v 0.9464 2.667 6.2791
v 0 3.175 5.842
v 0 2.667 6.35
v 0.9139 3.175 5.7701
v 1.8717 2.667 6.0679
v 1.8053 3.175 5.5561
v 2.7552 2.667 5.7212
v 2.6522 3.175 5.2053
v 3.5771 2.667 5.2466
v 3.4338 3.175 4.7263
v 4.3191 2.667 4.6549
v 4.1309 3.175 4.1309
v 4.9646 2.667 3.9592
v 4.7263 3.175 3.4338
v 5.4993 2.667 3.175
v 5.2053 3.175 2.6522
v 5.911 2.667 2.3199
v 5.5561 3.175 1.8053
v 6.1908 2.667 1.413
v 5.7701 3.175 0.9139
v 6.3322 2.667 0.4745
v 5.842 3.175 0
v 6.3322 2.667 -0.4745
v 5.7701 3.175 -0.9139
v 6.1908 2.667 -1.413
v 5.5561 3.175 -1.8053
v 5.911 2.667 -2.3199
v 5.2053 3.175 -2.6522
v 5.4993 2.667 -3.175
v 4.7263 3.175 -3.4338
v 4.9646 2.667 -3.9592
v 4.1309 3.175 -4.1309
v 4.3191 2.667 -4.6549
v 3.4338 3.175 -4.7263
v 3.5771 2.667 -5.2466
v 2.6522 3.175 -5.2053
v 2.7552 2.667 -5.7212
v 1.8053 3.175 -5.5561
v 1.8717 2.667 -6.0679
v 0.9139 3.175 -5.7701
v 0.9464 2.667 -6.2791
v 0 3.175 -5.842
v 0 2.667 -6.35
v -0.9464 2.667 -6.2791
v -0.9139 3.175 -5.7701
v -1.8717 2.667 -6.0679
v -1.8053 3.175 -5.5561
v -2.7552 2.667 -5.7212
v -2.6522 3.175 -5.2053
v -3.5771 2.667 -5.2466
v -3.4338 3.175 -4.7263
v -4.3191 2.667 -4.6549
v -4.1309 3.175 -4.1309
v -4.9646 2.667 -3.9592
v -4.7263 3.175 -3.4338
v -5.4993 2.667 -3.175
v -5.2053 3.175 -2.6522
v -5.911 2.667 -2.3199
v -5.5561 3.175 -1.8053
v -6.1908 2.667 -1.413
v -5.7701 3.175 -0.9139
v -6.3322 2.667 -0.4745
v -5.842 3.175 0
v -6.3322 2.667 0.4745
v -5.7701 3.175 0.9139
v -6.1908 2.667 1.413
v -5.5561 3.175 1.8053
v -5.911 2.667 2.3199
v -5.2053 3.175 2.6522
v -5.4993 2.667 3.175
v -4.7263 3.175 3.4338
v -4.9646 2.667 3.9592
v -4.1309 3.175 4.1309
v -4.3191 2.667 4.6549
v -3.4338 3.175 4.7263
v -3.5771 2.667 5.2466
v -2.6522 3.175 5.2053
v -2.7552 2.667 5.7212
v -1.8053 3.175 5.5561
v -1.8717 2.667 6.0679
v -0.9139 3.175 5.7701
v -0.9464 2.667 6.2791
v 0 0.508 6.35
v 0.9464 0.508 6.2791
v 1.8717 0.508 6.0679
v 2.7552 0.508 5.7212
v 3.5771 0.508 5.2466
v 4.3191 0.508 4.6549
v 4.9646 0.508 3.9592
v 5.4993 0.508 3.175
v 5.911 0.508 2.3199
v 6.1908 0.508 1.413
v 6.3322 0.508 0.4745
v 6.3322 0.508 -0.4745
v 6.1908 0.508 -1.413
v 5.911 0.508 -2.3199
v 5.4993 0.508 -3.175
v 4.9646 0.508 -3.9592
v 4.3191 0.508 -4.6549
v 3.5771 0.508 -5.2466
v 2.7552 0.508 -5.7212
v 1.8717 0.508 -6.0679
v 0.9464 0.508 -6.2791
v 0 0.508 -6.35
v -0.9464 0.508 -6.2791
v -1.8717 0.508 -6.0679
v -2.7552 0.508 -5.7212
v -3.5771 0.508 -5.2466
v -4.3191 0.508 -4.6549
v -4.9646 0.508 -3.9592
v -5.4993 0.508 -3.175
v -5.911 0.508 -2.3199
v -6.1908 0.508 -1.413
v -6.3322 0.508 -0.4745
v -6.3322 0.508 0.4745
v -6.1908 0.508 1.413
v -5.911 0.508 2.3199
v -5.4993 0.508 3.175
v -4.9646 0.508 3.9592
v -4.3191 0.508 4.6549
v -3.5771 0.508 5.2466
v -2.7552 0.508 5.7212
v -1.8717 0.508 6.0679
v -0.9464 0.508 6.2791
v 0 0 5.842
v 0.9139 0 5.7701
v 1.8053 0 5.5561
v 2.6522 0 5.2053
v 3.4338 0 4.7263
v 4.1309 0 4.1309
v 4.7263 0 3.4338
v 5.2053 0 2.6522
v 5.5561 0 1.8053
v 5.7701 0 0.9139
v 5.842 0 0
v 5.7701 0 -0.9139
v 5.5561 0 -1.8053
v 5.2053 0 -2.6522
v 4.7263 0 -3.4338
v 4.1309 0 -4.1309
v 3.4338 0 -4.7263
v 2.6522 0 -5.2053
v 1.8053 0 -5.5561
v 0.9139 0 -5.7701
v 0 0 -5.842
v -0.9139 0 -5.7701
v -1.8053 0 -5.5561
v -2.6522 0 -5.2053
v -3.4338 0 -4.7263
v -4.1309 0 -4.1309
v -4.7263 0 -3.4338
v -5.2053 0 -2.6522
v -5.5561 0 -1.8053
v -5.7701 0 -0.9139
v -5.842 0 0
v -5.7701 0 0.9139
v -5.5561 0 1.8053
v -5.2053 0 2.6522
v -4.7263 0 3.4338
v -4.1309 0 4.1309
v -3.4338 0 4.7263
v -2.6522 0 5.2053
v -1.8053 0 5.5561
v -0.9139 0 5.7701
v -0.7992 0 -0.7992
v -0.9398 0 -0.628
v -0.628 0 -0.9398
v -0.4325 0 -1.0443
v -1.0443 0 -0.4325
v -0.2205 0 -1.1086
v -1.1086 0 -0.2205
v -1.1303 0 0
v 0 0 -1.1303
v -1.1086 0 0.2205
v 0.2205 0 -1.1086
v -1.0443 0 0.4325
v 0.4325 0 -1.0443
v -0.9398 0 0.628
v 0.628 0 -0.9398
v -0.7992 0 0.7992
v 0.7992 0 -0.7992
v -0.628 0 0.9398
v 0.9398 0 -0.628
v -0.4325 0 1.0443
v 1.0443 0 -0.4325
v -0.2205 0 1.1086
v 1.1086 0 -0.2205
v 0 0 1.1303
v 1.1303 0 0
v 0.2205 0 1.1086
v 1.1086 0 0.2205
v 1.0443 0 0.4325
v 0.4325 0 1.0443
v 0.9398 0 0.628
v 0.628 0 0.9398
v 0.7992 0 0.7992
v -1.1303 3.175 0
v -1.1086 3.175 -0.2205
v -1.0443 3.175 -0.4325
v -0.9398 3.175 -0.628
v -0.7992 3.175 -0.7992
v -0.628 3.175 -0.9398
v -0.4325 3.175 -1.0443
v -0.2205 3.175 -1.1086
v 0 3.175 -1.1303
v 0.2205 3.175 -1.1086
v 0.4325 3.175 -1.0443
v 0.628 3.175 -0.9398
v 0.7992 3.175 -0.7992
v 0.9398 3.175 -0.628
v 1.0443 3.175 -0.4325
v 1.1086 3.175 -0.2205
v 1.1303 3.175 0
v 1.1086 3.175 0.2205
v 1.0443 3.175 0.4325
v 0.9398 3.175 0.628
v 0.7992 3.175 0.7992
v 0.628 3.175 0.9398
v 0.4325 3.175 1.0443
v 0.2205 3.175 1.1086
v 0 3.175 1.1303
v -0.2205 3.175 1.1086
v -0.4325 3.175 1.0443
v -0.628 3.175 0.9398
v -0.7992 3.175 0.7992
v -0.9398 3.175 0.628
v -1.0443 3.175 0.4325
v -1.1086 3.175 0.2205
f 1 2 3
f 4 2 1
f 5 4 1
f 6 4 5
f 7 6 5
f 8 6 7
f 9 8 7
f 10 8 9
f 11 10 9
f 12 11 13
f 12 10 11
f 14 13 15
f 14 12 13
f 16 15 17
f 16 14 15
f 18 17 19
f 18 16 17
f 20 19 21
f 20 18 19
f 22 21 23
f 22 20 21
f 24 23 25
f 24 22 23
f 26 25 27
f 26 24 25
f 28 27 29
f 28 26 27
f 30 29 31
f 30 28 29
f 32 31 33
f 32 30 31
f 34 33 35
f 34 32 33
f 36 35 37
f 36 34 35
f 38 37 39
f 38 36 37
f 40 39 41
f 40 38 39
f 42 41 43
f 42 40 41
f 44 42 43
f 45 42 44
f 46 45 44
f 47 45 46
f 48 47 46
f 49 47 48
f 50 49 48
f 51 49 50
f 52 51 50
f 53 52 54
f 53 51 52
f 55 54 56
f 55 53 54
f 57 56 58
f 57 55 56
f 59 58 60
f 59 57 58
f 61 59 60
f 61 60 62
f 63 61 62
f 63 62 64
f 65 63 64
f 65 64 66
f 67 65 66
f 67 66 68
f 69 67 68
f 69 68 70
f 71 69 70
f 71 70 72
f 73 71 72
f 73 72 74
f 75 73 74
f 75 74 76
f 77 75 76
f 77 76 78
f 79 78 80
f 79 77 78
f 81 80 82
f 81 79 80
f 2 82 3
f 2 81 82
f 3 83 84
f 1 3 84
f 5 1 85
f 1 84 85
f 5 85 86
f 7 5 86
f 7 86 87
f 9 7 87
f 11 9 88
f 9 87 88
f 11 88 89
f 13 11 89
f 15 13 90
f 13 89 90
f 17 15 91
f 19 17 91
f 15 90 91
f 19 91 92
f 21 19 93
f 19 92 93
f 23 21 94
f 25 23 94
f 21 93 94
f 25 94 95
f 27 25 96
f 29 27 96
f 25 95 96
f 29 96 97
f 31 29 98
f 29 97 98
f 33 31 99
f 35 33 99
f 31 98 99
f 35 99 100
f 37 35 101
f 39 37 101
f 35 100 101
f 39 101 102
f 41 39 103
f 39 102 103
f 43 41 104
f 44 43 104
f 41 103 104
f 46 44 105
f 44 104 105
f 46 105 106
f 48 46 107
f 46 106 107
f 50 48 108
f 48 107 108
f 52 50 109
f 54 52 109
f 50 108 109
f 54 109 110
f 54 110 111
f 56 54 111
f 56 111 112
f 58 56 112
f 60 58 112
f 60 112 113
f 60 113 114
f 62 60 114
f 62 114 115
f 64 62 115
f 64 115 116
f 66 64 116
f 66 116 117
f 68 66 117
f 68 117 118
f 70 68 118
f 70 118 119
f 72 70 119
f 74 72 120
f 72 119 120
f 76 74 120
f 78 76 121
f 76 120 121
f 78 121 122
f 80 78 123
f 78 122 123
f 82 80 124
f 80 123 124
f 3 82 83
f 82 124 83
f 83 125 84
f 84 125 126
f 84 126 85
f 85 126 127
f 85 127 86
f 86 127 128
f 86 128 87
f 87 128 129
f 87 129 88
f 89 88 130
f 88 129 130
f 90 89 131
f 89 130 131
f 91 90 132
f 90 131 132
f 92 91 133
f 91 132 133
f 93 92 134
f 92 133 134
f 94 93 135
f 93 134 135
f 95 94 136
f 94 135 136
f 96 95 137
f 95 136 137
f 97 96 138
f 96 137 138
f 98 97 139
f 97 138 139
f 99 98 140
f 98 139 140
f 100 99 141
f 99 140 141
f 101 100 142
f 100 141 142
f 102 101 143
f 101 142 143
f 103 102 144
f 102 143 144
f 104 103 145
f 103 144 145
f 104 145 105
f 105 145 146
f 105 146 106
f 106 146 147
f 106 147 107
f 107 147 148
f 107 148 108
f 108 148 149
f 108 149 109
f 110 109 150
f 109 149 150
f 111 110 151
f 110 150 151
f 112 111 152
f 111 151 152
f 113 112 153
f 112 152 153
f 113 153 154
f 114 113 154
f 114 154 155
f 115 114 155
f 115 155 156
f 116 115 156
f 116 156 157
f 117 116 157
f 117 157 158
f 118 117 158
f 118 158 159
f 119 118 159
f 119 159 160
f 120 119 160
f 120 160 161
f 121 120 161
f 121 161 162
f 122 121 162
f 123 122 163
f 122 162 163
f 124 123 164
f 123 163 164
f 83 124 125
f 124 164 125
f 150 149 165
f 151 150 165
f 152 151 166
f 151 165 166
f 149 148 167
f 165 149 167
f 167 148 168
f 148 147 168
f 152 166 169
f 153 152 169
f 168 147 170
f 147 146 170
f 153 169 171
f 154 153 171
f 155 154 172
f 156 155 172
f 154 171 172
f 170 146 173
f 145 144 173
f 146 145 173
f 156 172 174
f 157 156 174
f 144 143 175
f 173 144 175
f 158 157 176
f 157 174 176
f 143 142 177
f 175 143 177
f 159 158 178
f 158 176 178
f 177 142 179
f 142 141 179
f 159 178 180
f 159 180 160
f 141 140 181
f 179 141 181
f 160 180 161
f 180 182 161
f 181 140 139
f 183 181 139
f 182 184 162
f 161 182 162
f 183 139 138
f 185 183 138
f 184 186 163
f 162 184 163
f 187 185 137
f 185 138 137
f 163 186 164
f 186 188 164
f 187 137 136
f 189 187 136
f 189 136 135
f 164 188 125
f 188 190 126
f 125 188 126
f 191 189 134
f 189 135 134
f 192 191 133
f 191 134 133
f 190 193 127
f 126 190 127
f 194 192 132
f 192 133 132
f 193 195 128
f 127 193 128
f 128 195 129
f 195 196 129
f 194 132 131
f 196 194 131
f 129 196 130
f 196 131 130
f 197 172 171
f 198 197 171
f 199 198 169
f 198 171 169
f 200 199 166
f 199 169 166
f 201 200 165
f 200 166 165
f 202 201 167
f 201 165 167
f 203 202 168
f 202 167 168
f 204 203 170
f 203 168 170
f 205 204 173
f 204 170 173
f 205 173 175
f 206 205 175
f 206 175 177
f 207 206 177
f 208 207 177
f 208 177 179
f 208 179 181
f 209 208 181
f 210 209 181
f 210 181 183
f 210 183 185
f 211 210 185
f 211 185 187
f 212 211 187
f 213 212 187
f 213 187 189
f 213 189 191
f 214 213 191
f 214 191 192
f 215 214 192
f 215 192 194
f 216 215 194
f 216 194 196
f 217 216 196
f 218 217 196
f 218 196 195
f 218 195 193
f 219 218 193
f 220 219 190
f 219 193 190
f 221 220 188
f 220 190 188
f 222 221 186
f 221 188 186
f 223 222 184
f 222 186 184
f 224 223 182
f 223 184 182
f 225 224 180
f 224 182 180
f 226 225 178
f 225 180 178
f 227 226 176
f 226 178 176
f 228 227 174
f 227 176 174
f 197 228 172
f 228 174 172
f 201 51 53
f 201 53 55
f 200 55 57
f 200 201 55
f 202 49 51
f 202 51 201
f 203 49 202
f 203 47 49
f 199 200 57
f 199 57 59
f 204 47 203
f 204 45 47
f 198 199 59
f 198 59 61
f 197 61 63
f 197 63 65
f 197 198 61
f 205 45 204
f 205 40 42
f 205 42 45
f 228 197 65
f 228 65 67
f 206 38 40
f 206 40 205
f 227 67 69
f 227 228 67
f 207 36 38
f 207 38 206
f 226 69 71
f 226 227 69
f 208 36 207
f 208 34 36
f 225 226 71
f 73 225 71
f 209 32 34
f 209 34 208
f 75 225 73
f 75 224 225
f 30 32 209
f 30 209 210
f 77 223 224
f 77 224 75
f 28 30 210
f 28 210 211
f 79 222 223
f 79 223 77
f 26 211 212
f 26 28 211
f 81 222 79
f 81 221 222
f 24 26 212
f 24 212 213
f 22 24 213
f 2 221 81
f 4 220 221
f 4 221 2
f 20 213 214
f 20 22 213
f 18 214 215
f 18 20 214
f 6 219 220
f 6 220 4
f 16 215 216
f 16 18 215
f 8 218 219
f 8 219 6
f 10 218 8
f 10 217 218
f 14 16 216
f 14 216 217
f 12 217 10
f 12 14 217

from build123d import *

# Parameters (mm, degrees)
SKETCH1_R             = 6.35
BOSS_EXTRUDE1_DEPTH   = 3.175
F_4_40_TAPPED_HOLE1_D = 2.2606
CHAMFER1_SIZE         = 0.508


with BuildPart() as part:
    # Sketch1 → Boss-Extrude1 (new body)
    with BuildSketch(Plane(origin=(0, 0, 0), x_dir=(1, 0, 0), z_dir=(0, 1, 0))):
        with Locations(Location((0, 0, 0), (0, 0, 270))):
            Circle(SKETCH1_R)
    extrude(amount=BOSS_EXTRUDE1_DEPTH)

    # #4-40 Tapped Hole1 (through all)
    with Locations(Plane(origin=(0, 3.175, 0), x_dir=(1, 0, 0), z_dir=(0, 1, 0))):
        with Locations((0, 0)):
            Hole(F_4_40_TAPPED_HOLE1_D / 2)

    # Chamfer1
    chamfer1_edges = [part.edges().sort_by_distance(p)[0] for p in [
        (0, 0, -6.35),
        (0, 3.175, -6.35),
    ]]
    chamfer(chamfer1_edges, length=CHAMFER1_SIZE)


solid = part.part
